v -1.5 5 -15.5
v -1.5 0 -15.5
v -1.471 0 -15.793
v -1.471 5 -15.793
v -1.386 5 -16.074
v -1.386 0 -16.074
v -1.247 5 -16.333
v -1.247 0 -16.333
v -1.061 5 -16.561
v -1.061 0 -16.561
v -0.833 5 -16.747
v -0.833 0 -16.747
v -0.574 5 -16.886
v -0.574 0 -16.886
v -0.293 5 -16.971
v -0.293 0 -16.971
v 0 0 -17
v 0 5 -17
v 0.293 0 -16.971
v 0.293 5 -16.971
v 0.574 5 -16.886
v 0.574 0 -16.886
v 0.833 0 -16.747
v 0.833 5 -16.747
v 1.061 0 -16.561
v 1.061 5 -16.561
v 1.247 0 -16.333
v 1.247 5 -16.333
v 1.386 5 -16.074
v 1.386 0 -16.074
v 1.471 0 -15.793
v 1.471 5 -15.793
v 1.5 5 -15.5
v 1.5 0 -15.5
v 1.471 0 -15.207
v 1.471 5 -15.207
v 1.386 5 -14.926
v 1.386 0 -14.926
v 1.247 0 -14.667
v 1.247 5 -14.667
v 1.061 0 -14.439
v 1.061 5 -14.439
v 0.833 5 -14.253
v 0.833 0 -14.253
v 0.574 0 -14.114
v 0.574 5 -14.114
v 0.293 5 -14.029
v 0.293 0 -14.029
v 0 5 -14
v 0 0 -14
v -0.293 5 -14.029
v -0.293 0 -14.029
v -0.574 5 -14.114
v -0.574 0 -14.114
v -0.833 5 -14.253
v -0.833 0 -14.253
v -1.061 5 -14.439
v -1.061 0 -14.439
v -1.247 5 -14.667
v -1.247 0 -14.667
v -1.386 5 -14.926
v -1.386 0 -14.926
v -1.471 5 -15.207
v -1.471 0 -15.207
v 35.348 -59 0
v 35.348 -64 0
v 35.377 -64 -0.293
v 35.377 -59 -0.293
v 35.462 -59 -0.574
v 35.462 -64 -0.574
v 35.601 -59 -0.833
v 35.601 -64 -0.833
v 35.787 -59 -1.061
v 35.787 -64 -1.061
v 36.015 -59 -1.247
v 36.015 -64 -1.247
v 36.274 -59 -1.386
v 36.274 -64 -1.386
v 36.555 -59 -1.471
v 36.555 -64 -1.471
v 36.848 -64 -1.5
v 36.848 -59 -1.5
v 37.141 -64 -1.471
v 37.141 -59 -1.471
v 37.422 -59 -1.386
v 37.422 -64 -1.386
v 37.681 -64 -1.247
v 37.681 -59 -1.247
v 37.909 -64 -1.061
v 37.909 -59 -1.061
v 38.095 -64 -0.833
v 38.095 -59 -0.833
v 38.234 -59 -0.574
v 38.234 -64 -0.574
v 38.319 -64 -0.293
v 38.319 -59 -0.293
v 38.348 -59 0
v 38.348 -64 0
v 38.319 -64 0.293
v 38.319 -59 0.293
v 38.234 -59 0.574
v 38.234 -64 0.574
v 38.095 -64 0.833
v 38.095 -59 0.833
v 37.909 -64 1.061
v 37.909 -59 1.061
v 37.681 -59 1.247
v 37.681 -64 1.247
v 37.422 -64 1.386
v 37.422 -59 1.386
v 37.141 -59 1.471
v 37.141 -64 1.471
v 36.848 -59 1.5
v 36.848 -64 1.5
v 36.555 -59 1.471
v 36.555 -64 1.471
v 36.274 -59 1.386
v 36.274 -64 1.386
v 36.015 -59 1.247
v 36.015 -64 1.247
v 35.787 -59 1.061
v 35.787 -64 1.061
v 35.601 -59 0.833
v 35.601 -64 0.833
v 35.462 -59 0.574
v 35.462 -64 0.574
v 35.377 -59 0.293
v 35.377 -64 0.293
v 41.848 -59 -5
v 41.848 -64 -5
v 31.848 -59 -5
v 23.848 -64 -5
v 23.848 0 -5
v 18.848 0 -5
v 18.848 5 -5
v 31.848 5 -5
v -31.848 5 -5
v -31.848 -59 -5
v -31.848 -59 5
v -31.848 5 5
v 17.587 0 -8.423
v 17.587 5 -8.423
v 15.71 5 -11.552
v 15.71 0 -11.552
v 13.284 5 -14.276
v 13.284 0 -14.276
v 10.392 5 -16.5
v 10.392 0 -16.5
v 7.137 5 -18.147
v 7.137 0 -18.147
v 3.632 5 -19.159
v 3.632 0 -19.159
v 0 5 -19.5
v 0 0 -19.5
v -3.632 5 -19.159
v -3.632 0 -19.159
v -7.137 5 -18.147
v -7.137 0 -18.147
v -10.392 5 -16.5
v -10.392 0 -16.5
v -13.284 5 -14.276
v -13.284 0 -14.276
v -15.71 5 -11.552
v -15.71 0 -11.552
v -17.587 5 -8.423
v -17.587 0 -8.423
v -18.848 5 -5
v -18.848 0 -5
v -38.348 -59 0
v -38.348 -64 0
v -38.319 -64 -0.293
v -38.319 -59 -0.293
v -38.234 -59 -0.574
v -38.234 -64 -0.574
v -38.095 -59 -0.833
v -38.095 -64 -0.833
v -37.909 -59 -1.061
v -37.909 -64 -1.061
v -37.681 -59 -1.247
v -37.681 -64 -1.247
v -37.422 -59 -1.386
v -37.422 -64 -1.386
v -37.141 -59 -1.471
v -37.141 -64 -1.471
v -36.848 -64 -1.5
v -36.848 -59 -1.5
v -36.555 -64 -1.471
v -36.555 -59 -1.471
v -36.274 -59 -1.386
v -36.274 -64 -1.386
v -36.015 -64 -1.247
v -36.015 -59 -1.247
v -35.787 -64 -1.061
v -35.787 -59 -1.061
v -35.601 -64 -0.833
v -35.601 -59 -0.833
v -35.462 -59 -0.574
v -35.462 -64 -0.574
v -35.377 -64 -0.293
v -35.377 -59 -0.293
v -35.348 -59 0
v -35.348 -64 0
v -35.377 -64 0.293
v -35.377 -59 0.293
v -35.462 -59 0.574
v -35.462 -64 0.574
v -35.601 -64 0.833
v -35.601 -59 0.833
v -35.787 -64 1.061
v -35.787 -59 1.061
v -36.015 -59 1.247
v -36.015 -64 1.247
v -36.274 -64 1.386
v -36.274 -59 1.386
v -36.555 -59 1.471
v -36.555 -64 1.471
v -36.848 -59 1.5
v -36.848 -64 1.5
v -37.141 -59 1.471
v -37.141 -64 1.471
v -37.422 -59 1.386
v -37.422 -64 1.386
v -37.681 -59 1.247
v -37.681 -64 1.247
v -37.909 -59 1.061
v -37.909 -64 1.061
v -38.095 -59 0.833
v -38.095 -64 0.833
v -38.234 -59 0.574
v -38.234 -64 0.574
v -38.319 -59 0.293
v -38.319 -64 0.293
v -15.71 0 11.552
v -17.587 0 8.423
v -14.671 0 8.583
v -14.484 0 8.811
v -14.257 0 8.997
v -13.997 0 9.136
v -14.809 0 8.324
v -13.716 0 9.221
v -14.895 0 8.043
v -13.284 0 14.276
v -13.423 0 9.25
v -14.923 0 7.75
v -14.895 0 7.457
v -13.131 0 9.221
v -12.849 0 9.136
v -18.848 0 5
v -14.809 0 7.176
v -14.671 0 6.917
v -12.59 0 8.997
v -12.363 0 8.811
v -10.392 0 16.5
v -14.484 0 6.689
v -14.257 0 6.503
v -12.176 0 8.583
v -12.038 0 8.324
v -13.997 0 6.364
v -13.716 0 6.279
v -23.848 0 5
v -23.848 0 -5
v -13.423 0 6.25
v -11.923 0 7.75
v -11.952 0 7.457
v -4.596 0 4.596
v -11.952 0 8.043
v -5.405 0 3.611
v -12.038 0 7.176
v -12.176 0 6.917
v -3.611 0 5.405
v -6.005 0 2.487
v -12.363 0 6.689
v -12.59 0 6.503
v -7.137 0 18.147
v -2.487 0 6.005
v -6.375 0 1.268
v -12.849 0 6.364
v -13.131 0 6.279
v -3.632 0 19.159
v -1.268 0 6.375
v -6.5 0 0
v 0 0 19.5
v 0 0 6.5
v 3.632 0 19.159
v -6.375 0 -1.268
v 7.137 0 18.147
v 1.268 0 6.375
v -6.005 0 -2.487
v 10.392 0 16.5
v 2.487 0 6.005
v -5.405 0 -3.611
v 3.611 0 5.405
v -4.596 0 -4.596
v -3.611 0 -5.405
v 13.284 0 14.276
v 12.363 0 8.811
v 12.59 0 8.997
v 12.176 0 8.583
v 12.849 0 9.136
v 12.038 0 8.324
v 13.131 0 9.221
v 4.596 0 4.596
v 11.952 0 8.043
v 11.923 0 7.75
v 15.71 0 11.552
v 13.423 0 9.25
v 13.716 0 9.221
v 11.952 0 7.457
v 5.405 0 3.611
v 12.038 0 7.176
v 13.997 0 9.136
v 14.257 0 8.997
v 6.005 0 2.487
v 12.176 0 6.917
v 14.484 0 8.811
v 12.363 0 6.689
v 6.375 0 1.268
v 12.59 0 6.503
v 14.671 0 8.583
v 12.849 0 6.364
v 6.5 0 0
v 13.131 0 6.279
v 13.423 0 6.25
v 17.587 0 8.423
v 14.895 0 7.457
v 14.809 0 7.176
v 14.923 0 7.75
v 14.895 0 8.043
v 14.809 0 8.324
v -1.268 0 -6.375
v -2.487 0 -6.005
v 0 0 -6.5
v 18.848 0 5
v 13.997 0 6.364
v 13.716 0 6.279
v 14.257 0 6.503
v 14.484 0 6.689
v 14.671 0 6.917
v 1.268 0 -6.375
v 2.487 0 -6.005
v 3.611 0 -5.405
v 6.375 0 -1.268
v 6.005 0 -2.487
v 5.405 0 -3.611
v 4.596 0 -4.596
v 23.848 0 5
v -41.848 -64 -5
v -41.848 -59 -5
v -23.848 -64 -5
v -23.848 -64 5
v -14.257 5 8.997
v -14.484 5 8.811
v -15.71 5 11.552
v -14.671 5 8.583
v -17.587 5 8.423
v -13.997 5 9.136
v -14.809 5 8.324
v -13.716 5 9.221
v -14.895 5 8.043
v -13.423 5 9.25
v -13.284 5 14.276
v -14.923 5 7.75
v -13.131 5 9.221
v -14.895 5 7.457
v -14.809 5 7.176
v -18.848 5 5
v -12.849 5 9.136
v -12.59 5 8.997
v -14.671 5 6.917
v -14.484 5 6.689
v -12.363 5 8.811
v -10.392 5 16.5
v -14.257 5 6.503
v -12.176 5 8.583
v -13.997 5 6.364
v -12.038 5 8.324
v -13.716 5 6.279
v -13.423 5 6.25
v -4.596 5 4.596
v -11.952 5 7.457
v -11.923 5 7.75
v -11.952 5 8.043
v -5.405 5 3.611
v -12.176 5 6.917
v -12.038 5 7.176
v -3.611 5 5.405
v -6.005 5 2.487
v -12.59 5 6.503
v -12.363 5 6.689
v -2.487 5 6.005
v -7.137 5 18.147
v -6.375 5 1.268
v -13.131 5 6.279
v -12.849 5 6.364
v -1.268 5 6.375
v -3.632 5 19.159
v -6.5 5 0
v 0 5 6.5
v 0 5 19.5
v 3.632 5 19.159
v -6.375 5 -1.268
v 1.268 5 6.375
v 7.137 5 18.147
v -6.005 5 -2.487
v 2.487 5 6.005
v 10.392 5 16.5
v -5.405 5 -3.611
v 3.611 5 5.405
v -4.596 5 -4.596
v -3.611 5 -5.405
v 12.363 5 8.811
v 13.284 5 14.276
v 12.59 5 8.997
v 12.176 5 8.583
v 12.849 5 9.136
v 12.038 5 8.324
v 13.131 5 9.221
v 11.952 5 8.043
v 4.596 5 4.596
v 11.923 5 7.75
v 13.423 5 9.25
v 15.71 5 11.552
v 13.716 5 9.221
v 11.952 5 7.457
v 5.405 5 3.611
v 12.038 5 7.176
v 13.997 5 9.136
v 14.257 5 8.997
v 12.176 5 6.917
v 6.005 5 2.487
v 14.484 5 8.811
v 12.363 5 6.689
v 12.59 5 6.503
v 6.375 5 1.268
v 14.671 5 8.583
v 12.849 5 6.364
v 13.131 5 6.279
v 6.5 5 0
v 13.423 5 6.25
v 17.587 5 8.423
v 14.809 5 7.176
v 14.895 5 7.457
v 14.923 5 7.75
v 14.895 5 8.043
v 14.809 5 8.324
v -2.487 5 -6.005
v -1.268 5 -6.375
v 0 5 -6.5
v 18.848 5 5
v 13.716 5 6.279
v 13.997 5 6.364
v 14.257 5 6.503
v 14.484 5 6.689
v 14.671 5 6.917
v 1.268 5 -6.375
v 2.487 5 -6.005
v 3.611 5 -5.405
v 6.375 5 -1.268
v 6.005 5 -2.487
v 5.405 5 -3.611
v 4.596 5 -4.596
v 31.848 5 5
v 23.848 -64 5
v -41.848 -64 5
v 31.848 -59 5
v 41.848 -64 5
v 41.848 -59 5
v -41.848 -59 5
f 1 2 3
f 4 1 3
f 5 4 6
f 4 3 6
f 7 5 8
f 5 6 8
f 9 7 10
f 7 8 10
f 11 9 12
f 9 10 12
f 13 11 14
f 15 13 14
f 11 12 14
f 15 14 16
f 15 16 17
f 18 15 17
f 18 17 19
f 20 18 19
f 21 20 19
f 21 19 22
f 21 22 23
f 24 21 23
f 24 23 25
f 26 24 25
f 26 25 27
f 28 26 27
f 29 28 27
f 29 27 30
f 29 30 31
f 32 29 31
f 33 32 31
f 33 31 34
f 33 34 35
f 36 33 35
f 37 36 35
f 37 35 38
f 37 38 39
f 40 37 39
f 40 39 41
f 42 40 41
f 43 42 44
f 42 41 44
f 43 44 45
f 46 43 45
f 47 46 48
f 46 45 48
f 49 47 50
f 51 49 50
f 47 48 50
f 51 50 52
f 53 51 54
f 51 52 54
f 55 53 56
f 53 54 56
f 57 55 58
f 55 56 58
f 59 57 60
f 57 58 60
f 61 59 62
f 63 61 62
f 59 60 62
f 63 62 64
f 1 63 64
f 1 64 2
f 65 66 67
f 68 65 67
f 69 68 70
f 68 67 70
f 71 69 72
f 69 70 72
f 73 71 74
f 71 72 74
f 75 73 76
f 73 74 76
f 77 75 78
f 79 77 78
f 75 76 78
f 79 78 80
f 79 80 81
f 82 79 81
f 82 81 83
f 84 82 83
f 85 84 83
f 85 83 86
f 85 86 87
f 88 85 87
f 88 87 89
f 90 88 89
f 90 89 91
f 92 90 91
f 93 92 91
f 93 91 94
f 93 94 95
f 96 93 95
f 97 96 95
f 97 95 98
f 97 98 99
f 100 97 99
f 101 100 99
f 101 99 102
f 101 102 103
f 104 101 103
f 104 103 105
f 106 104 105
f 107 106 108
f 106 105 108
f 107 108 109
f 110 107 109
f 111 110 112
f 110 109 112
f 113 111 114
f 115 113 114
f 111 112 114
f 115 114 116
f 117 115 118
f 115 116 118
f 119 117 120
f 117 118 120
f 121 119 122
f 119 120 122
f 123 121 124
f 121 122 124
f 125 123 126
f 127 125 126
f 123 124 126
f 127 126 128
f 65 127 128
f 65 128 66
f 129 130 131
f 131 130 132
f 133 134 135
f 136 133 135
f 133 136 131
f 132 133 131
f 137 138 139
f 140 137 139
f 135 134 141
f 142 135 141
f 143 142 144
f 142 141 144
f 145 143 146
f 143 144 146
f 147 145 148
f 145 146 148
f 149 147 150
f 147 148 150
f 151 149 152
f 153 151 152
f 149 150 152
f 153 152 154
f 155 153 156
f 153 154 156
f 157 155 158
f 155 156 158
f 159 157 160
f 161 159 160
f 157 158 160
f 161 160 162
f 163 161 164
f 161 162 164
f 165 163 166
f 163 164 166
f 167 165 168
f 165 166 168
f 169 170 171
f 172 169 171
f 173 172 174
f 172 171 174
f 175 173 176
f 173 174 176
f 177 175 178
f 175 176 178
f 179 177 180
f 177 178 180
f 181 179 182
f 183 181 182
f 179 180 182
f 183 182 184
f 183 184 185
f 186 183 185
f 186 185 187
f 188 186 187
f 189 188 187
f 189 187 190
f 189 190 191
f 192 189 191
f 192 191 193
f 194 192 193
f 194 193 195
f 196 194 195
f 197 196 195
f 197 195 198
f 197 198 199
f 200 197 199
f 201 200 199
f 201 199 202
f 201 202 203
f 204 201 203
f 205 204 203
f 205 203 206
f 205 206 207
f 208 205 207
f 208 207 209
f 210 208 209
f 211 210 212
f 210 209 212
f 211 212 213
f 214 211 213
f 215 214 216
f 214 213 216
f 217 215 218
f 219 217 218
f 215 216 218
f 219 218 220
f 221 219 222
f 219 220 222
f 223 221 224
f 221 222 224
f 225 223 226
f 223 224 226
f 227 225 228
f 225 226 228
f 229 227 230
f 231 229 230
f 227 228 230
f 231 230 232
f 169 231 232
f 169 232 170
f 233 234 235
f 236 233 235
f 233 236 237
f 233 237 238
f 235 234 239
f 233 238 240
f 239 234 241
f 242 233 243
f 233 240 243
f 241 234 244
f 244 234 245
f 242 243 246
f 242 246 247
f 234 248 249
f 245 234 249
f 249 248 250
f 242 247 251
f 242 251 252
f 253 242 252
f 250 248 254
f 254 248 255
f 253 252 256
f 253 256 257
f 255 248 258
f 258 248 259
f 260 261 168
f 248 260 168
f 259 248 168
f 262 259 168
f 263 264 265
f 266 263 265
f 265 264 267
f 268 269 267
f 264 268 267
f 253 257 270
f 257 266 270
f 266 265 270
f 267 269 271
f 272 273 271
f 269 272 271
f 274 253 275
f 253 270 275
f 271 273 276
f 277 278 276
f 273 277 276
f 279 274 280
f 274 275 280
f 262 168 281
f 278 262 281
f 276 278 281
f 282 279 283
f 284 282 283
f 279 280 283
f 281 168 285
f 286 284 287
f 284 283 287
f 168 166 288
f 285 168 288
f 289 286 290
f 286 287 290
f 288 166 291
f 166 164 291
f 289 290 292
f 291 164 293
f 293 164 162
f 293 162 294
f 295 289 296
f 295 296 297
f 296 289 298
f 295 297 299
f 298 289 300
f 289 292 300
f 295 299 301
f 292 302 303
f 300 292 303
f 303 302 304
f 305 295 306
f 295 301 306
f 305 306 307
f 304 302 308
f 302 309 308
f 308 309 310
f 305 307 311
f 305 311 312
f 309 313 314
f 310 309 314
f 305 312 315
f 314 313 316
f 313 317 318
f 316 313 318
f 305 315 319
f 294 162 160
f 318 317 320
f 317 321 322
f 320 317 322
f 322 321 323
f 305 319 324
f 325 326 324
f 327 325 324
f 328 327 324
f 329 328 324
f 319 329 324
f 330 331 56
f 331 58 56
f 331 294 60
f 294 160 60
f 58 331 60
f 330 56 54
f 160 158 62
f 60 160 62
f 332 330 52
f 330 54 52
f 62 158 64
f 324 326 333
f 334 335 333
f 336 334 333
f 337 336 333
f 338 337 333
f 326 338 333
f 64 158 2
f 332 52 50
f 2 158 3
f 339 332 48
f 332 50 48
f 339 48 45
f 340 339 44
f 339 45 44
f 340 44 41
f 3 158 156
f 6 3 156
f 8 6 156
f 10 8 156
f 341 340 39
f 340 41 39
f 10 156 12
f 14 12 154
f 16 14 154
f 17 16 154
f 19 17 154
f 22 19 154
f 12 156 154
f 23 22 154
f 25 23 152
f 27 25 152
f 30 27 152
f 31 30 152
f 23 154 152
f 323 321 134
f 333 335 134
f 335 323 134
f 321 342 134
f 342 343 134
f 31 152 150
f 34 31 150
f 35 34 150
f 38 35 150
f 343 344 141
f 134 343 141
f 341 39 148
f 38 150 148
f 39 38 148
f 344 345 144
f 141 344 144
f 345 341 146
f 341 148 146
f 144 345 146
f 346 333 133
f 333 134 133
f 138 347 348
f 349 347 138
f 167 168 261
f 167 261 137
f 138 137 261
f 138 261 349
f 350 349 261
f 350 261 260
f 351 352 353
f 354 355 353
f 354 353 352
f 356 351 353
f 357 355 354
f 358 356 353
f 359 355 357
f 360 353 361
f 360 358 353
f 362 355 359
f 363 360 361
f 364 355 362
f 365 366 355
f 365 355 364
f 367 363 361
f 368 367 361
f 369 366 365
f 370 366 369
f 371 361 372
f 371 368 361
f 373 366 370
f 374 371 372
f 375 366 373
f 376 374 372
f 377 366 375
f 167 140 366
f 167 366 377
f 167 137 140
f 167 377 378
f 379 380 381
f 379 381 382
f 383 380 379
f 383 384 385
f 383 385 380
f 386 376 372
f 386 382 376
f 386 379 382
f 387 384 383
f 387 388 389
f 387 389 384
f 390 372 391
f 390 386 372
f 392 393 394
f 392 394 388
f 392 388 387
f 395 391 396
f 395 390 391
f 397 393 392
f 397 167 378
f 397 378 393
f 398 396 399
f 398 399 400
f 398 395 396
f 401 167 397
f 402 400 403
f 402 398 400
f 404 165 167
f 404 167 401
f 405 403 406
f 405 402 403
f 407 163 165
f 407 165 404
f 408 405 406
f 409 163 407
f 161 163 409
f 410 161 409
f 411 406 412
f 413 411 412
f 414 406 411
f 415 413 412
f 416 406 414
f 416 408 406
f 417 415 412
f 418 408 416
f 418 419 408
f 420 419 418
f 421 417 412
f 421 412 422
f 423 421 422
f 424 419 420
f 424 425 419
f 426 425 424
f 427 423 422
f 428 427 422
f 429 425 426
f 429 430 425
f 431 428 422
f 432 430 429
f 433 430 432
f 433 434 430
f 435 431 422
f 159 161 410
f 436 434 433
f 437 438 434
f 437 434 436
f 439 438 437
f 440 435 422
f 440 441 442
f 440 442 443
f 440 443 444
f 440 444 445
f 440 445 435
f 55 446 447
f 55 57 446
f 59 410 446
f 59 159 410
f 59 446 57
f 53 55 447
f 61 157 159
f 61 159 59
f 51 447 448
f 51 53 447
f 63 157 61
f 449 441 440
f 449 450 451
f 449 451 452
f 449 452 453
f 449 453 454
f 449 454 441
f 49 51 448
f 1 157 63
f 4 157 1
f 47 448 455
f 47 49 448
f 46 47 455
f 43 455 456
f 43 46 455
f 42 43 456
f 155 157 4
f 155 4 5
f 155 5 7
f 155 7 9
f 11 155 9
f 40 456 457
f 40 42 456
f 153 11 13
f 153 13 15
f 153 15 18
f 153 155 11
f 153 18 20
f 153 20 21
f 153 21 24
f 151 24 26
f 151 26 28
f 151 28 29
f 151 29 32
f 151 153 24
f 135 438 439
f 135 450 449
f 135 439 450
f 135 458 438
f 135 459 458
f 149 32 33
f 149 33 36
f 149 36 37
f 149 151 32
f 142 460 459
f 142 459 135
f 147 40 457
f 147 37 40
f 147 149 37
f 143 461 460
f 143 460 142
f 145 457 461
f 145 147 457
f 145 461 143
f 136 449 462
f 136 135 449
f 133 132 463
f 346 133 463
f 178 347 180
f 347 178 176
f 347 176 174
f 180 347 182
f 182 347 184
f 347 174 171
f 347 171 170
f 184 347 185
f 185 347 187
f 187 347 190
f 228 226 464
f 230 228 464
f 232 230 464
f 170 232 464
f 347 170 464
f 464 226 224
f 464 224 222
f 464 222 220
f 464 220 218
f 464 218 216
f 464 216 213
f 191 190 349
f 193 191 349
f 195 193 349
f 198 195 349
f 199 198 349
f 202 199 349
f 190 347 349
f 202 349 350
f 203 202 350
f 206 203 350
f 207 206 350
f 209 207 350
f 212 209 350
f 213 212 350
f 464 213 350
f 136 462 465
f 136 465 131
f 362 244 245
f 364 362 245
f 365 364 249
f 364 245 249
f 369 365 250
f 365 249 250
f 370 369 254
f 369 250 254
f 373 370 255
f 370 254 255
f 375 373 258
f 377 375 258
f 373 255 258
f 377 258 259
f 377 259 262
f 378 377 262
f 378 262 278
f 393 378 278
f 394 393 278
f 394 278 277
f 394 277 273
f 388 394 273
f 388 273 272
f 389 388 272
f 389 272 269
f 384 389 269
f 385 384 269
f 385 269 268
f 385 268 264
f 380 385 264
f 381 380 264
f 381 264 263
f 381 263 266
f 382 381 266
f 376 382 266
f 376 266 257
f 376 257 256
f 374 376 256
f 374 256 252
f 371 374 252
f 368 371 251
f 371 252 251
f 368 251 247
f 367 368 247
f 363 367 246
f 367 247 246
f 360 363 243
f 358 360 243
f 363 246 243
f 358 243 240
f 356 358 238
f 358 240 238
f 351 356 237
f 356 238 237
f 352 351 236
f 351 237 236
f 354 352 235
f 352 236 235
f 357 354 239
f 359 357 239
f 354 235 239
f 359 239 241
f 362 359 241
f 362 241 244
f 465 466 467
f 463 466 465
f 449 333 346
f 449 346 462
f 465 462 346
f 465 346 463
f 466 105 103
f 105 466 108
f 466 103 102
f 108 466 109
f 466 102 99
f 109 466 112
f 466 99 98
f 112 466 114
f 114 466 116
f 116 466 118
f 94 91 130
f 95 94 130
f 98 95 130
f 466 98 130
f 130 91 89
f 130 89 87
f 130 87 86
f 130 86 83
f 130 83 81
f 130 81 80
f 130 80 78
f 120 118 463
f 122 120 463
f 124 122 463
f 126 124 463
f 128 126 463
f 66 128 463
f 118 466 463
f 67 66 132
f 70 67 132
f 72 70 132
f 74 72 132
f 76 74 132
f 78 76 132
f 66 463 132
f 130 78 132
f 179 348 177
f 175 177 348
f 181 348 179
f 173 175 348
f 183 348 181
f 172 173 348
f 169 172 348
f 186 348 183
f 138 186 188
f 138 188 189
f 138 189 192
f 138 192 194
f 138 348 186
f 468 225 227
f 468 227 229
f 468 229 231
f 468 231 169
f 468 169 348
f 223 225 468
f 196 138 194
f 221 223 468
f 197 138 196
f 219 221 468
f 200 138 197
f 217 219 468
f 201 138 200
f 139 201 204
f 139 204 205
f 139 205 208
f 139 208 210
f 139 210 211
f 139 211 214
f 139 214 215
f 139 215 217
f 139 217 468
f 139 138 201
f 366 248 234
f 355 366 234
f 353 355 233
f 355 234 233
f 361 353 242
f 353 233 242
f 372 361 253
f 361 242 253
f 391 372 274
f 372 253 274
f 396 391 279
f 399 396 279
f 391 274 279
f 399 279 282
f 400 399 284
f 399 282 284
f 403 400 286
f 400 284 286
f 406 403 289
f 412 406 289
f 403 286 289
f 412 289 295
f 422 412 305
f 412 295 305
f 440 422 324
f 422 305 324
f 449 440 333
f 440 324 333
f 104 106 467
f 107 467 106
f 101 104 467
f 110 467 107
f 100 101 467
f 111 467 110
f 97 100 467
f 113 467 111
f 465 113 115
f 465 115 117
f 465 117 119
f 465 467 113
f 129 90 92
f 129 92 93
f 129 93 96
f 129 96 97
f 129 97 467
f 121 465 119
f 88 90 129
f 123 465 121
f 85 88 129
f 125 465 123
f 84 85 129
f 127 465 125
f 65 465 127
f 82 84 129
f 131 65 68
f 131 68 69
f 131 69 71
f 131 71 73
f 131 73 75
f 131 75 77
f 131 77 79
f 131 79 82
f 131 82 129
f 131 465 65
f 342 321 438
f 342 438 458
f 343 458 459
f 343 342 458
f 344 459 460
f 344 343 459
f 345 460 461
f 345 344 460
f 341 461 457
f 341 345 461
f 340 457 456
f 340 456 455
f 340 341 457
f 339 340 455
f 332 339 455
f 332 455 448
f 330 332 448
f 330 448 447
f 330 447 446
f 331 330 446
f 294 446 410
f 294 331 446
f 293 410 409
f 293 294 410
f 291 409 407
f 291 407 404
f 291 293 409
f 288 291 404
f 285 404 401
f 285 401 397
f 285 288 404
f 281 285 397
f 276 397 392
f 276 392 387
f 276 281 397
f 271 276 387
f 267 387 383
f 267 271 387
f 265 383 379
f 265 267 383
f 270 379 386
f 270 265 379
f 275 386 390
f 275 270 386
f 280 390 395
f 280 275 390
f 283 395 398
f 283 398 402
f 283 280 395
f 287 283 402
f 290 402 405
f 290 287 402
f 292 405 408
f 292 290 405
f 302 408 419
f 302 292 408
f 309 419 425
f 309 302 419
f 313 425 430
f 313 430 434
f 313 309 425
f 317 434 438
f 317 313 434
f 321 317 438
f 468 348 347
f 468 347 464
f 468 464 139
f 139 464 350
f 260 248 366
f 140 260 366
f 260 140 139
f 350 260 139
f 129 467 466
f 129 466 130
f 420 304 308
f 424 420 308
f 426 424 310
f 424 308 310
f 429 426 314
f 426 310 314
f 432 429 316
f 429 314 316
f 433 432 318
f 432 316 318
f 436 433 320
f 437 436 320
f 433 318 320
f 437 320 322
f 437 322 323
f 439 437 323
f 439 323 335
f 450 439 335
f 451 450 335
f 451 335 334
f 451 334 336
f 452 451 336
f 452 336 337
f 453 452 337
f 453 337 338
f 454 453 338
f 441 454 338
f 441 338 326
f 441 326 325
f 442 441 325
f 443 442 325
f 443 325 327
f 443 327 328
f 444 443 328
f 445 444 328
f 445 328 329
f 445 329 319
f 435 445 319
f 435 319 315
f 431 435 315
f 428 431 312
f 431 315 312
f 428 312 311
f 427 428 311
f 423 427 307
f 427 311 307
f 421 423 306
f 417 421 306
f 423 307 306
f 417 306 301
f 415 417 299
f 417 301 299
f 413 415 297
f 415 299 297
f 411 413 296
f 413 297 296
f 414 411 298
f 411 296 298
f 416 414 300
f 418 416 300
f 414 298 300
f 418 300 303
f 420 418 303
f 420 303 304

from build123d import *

# Parameters (mm, degrees)
SKETCH1_R                 = 6.5
BOSS_EXTRUDE1_DEPTH       = 5
SKETCH2_W                 = 8
SKETCH2_H                 = 10
BOSS_EXTRUDE2_DEPTH       = 64
SKETCH5_W                 = 10
SKETCH5_H                 = 5
BOSS_EXTRUDE3_DEPTH       = 10
SKETCH6_W                 = 10
SKETCH6_H                 = 5
BOSS_EXTRUDE4_DEPTH       = 10
F_3_0MM_DOWEL_HOLE1_D     = 3
F_3_0MM_DOWEL_HOLE1_DEPTH = 23
F_3_0MM_DOWEL_HOLE1_TIP   = 0.901290929
F_3_0MM_DOWEL_HOLE2_D     = 3


with BuildPart() as part:
    # Sketch1 → Boss-Extrude1 (new body)
    with BuildSketch(Plane(origin=(0, 0, 0), x_dir=(1, 0, 0), z_dir=(0, 1, 0))):
        with BuildLine():
            Line((-31.848076825, -5), (-18.848076825, -5))
            ThreePointArc((-18.848076825, -5), (0, -19.5), (18.848076825, -5))
            Line((18.848076825, -5), (31.848076825, -5))
            Line((31.848076825, -5), (31.848076825, 5))
            Line((31.848076825, 5), (18.848076825, 5))
            ThreePointArc((18.848076825, 5), (0, 19.5), (-18.848076825, 5))
            Line((-18.848076825, 5), (-31.848076825, 5))
            Line((-31.848076825, 5), (-31.848076825, -5))
        make_face()
        Circle(SKETCH1_R, mode=Mode.SUBTRACT)
    extrude(amount=BOSS_EXTRUDE1_DEPTH)

    # Sketch2 → Boss-Extrude2 (add)
    with BuildSketch(Plane.XZ):
        with Locations((-27.848076825, 0)):
            Rectangle(SKETCH2_W, SKETCH2_H)
        with Locations((27.848076825, 0)):
            Rectangle(SKETCH2_W, SKETCH2_H)
    extrude(amount=BOSS_EXTRUDE2_DEPTH)

    # Sketch5 → Boss-Extrude3 (add)
    with BuildSketch(Plane.ZY.offset(31.848076825)):
        with Locations((0, -61.5)):
            Rectangle(SKETCH5_W, SKETCH5_H)
    extrude(amount=BOSS_EXTRUDE3_DEPTH)

    # Sketch6 → Boss-Extrude4 (add)
    with BuildSketch(Plane(origin=(31.848076825, 0, 0), x_dir=(0, 0, -1), z_dir=(1, 0, 0))):
        with Locations((0, -61.5)):
            Rectangle(SKETCH6_W, SKETCH6_H)
    extrude(amount=BOSS_EXTRUDE4_DEPTH)

    # Ø3.0mm Dowel Hole1
    with Locations(Plane(origin=(0, -59, 0), x_dir=(1, 0, 0), z_dir=(0, 1, 0))):
        with Locations((36.848076825, 0), (-36.848076825, 0)):
            Hole(F_3_0MM_DOWEL_HOLE1_D / 2, depth=F_3_0MM_DOWEL_HOLE1_DEPTH)
            with Locations((0, 0, -(F_3_0MM_DOWEL_HOLE1_DEPTH + F_3_0MM_DOWEL_HOLE1_TIP / 2))):  # 118° drill point
                Cone(0, F_3_0MM_DOWEL_HOLE1_D / 2, F_3_0MM_DOWEL_HOLE1_TIP, mode=Mode.SUBTRACT)

    # Ø3.0mm Dowel Hole2 (through all)
    with Locations(Plane(origin=(0, 5, 0), x_dir=(1, 0, 0), z_dir=(0, 1, 0))):
        with Locations((0, 15.5), (13.423393759, -7.75), (-13.423393759, -7.75)):
            Hole(F_3_0MM_DOWEL_HOLE2_D / 2)


solid = part.part
